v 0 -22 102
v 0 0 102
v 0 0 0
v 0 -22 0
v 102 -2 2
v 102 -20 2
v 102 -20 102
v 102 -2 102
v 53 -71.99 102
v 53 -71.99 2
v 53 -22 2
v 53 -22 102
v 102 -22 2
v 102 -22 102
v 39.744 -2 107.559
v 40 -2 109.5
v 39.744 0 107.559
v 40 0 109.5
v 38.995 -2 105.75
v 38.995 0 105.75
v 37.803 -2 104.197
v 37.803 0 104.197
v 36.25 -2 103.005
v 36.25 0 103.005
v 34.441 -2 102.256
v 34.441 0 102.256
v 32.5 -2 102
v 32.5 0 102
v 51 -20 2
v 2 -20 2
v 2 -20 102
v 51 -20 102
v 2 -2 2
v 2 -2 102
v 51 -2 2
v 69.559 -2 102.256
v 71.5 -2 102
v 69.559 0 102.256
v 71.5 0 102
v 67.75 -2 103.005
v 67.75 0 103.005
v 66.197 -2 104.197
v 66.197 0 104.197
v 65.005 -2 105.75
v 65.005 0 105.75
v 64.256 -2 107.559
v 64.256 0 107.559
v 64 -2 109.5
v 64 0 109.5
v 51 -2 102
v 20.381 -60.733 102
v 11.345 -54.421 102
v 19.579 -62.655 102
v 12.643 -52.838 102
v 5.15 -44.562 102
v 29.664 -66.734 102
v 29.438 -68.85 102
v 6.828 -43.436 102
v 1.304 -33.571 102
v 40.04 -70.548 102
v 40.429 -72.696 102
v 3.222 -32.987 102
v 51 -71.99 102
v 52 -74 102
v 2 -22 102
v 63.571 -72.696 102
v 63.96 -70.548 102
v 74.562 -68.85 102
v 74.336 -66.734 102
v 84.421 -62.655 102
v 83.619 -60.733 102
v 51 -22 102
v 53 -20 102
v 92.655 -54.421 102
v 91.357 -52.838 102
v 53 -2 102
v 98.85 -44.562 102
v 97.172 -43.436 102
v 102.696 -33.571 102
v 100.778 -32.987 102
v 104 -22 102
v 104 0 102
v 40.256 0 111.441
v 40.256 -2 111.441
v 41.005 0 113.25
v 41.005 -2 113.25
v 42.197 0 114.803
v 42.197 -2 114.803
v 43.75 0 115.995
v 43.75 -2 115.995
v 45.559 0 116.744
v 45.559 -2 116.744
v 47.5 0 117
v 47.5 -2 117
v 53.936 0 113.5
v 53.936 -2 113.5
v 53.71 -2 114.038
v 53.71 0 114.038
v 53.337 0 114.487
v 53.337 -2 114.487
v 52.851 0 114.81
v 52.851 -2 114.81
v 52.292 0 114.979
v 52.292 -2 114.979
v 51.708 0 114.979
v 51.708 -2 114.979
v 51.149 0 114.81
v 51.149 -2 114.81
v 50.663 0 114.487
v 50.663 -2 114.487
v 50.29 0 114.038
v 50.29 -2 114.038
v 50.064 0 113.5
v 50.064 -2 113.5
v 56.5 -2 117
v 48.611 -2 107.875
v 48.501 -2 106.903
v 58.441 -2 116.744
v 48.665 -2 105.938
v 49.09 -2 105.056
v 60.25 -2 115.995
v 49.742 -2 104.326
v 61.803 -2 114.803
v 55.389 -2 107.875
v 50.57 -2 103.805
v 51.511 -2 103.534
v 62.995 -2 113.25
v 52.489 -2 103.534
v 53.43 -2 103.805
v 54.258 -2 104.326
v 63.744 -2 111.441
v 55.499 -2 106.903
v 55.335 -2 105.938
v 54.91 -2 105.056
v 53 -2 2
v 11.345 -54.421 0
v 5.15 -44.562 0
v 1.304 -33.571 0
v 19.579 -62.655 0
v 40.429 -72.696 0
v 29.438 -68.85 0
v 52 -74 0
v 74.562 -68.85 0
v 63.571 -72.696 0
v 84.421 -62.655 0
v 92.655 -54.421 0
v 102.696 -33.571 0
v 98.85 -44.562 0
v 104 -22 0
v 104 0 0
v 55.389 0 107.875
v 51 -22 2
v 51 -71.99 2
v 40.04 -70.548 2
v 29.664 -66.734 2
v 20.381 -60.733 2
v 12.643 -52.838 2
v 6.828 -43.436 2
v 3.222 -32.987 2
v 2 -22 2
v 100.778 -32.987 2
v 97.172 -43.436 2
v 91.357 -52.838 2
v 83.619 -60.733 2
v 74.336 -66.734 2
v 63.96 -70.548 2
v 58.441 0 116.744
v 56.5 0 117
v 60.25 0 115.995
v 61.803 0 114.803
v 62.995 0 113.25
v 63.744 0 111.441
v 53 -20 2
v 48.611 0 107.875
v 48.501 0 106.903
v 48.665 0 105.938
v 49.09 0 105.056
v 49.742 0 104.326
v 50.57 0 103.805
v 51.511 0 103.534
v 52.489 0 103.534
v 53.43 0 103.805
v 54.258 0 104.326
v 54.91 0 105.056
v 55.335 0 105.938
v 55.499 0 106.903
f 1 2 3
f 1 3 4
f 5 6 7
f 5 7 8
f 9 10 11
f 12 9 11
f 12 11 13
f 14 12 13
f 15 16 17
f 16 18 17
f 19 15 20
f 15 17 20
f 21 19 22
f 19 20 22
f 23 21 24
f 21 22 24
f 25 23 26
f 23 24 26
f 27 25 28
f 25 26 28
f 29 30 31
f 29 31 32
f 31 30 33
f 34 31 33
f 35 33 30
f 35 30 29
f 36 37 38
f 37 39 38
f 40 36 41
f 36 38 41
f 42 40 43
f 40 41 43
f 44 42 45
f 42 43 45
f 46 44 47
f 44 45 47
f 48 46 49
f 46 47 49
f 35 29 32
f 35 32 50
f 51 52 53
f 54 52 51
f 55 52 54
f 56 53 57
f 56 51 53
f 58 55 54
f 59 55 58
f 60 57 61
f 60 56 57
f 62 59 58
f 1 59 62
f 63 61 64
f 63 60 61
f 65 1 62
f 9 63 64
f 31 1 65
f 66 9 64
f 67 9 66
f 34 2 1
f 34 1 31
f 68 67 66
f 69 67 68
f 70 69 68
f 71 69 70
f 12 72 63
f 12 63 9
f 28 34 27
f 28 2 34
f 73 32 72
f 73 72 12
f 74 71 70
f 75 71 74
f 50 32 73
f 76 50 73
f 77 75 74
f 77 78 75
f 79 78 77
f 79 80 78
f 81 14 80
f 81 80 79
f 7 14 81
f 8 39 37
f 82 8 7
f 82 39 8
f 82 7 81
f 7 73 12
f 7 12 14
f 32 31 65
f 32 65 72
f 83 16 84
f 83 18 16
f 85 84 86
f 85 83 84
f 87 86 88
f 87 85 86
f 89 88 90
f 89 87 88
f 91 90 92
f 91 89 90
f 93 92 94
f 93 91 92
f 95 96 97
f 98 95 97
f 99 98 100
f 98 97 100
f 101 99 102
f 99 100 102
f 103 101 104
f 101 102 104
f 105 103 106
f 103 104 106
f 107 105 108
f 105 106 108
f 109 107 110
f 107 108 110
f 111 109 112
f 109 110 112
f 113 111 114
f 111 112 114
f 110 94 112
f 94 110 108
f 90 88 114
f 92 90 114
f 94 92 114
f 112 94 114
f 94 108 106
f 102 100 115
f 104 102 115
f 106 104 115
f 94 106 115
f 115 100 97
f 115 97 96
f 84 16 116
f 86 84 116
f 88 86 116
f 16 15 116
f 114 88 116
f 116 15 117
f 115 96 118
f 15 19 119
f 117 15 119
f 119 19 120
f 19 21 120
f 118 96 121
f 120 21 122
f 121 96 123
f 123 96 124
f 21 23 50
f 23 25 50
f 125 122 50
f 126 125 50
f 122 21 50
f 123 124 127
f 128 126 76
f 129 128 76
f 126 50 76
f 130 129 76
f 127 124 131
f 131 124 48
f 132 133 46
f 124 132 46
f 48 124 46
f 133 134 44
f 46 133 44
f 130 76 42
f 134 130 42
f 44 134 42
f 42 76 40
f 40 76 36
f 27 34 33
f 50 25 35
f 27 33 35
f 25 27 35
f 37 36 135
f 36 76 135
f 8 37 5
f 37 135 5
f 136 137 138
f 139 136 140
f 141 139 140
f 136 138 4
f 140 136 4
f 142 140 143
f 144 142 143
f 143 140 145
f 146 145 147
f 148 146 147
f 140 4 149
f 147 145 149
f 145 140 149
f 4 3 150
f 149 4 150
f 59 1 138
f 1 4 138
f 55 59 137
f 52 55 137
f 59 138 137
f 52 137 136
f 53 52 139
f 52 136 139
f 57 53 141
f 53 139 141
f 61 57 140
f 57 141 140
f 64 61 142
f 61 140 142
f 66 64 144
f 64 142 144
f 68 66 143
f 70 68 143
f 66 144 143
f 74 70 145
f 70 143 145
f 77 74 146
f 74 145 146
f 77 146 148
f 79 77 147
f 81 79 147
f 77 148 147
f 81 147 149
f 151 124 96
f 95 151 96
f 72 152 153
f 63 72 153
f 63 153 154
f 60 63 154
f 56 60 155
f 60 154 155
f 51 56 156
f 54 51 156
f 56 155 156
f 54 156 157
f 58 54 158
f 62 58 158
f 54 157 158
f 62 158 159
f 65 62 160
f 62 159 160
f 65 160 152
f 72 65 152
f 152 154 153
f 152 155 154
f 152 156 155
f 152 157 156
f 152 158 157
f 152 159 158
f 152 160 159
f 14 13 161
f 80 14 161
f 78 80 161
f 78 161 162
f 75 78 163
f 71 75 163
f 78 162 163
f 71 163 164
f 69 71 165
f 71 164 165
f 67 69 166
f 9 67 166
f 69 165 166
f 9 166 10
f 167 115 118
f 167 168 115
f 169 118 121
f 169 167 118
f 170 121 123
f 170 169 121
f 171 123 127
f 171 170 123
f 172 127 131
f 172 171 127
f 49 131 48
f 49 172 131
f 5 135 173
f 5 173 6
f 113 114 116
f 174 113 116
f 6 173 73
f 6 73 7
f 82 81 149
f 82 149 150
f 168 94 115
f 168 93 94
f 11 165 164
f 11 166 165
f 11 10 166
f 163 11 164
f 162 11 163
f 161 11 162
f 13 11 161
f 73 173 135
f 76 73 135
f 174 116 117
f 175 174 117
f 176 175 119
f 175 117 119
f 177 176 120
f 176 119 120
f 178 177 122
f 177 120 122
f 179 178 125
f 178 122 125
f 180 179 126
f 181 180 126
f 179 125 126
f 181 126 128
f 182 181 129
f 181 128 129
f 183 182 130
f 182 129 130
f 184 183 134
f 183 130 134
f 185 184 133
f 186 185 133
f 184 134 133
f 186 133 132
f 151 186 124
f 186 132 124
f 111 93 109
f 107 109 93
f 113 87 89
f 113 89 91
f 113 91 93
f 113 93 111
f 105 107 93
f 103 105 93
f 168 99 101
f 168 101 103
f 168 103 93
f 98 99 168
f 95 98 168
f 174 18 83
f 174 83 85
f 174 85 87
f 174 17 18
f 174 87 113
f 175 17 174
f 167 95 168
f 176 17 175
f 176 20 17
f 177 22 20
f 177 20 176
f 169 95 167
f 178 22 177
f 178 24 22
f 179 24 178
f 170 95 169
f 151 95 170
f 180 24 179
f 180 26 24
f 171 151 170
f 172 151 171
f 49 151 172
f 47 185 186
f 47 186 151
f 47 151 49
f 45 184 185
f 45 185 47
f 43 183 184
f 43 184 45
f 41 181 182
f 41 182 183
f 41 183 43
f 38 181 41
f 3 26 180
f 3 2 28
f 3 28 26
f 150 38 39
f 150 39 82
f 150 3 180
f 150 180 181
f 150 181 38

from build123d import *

# Parameters (mm, degrees)
F1_DEPTH = 2
F2_W     = 49
F2_H     = 18
F3_DEPTH = 100
F4_W     = 24
F4_H     = 2
F5_DEPTH = 15
F7_DEPTH = 2
F8_R     = 7.49999


# Not quite as in the source:
# - a fillet or chamfer is up to 0.001 mm smaller than in the source, because OpenCascade refuses the exact size


with BuildPart() as f1:
    # F0 (on Top) → F1 (new body)
    with BuildSketch(Plane.XY):
        with BuildLine():
            Line((104, 0), (0, 0))
            Line((0, 0), (0, -22))
            ThreePointArc((0, -22), (52, -74), (104, -22))
            Line((104, -22), (104, 0))
        make_face()
    extrude(amount=F1_DEPTH)

    # F2 (on face) → F3 (join)
    with BuildSketch(Plane.XY.offset(2)):
        with BuildLine():
            Line((104, 0), (0, 0))
            Line((0, 0), (0, -22))
            ThreePointArc((0, -22), (52, -74), (104, -22))
            Line((104, -22), (104, 0))
        make_face()
        with BuildLine():
            ThreePointArc((51, -71.9899989998), (16.2928578573, -57), (2, -22))
            Line((2, -22), (51, -22))
            Line((51, -22), (51, -71.9899989998))
        make_face(mode=Mode.SUBTRACT)
        with BuildLine():
            ThreePointArc((102, -22), (87.7071421427, -57), (53, -71.9899989998))
            Line((53, -71.9899989998), (53, -22))
            Line((53, -22), (102, -22))
        make_face(mode=Mode.SUBTRACT)
        with Locations((26.5, -11)):
            Rectangle(F2_W, F2_H, mode=Mode.SUBTRACT)
        with Locations((77.5, -11)):
            Rectangle(F2_W, F2_H, mode=Mode.SUBTRACT)
    extrude(amount=F3_DEPTH)

    # F4 (on face) → F5 (join)
    with BuildSketch(Plane.XY.offset(102)):
        with Locations((52, -1)):
            Rectangle(F4_W, F4_H)
    extrude(amount=F5_DEPTH)

    # F6 (on face) → F7 (cut, through all)
    with BuildSketch(Plane.XZ.offset(2)):
        with BuildLine():
            Line((55.3888604279, 107.875), (53.9364916731, 113.5))
            ThreePointArc((53.9364916731, 113.5), (52, 115), (50.0635083269, 113.5))
            Line((50.0635083269, 113.5), (48.6111395721, 107.875))
            ThreePointArc((48.6111395721, 107.875), (52, 103.5), (55.3888604279, 107.875))
        make_face()
    extrude(amount=-F7_DEPTH, mode=Mode.SUBTRACT)

    # F8 (radius 7.5 in the source; OpenCascade refuses exactly that, so slightly less here)
    f8_edges = [f1.edges().sort_by_distance(p)[0] for p in [
        (64, -1, 102),
        (64, -1, 117),
        (40, -1, 102),
        (40, -1, 117),
    ]]
    fillet(f8_edges, radius=F8_R)


solid = f1.part
